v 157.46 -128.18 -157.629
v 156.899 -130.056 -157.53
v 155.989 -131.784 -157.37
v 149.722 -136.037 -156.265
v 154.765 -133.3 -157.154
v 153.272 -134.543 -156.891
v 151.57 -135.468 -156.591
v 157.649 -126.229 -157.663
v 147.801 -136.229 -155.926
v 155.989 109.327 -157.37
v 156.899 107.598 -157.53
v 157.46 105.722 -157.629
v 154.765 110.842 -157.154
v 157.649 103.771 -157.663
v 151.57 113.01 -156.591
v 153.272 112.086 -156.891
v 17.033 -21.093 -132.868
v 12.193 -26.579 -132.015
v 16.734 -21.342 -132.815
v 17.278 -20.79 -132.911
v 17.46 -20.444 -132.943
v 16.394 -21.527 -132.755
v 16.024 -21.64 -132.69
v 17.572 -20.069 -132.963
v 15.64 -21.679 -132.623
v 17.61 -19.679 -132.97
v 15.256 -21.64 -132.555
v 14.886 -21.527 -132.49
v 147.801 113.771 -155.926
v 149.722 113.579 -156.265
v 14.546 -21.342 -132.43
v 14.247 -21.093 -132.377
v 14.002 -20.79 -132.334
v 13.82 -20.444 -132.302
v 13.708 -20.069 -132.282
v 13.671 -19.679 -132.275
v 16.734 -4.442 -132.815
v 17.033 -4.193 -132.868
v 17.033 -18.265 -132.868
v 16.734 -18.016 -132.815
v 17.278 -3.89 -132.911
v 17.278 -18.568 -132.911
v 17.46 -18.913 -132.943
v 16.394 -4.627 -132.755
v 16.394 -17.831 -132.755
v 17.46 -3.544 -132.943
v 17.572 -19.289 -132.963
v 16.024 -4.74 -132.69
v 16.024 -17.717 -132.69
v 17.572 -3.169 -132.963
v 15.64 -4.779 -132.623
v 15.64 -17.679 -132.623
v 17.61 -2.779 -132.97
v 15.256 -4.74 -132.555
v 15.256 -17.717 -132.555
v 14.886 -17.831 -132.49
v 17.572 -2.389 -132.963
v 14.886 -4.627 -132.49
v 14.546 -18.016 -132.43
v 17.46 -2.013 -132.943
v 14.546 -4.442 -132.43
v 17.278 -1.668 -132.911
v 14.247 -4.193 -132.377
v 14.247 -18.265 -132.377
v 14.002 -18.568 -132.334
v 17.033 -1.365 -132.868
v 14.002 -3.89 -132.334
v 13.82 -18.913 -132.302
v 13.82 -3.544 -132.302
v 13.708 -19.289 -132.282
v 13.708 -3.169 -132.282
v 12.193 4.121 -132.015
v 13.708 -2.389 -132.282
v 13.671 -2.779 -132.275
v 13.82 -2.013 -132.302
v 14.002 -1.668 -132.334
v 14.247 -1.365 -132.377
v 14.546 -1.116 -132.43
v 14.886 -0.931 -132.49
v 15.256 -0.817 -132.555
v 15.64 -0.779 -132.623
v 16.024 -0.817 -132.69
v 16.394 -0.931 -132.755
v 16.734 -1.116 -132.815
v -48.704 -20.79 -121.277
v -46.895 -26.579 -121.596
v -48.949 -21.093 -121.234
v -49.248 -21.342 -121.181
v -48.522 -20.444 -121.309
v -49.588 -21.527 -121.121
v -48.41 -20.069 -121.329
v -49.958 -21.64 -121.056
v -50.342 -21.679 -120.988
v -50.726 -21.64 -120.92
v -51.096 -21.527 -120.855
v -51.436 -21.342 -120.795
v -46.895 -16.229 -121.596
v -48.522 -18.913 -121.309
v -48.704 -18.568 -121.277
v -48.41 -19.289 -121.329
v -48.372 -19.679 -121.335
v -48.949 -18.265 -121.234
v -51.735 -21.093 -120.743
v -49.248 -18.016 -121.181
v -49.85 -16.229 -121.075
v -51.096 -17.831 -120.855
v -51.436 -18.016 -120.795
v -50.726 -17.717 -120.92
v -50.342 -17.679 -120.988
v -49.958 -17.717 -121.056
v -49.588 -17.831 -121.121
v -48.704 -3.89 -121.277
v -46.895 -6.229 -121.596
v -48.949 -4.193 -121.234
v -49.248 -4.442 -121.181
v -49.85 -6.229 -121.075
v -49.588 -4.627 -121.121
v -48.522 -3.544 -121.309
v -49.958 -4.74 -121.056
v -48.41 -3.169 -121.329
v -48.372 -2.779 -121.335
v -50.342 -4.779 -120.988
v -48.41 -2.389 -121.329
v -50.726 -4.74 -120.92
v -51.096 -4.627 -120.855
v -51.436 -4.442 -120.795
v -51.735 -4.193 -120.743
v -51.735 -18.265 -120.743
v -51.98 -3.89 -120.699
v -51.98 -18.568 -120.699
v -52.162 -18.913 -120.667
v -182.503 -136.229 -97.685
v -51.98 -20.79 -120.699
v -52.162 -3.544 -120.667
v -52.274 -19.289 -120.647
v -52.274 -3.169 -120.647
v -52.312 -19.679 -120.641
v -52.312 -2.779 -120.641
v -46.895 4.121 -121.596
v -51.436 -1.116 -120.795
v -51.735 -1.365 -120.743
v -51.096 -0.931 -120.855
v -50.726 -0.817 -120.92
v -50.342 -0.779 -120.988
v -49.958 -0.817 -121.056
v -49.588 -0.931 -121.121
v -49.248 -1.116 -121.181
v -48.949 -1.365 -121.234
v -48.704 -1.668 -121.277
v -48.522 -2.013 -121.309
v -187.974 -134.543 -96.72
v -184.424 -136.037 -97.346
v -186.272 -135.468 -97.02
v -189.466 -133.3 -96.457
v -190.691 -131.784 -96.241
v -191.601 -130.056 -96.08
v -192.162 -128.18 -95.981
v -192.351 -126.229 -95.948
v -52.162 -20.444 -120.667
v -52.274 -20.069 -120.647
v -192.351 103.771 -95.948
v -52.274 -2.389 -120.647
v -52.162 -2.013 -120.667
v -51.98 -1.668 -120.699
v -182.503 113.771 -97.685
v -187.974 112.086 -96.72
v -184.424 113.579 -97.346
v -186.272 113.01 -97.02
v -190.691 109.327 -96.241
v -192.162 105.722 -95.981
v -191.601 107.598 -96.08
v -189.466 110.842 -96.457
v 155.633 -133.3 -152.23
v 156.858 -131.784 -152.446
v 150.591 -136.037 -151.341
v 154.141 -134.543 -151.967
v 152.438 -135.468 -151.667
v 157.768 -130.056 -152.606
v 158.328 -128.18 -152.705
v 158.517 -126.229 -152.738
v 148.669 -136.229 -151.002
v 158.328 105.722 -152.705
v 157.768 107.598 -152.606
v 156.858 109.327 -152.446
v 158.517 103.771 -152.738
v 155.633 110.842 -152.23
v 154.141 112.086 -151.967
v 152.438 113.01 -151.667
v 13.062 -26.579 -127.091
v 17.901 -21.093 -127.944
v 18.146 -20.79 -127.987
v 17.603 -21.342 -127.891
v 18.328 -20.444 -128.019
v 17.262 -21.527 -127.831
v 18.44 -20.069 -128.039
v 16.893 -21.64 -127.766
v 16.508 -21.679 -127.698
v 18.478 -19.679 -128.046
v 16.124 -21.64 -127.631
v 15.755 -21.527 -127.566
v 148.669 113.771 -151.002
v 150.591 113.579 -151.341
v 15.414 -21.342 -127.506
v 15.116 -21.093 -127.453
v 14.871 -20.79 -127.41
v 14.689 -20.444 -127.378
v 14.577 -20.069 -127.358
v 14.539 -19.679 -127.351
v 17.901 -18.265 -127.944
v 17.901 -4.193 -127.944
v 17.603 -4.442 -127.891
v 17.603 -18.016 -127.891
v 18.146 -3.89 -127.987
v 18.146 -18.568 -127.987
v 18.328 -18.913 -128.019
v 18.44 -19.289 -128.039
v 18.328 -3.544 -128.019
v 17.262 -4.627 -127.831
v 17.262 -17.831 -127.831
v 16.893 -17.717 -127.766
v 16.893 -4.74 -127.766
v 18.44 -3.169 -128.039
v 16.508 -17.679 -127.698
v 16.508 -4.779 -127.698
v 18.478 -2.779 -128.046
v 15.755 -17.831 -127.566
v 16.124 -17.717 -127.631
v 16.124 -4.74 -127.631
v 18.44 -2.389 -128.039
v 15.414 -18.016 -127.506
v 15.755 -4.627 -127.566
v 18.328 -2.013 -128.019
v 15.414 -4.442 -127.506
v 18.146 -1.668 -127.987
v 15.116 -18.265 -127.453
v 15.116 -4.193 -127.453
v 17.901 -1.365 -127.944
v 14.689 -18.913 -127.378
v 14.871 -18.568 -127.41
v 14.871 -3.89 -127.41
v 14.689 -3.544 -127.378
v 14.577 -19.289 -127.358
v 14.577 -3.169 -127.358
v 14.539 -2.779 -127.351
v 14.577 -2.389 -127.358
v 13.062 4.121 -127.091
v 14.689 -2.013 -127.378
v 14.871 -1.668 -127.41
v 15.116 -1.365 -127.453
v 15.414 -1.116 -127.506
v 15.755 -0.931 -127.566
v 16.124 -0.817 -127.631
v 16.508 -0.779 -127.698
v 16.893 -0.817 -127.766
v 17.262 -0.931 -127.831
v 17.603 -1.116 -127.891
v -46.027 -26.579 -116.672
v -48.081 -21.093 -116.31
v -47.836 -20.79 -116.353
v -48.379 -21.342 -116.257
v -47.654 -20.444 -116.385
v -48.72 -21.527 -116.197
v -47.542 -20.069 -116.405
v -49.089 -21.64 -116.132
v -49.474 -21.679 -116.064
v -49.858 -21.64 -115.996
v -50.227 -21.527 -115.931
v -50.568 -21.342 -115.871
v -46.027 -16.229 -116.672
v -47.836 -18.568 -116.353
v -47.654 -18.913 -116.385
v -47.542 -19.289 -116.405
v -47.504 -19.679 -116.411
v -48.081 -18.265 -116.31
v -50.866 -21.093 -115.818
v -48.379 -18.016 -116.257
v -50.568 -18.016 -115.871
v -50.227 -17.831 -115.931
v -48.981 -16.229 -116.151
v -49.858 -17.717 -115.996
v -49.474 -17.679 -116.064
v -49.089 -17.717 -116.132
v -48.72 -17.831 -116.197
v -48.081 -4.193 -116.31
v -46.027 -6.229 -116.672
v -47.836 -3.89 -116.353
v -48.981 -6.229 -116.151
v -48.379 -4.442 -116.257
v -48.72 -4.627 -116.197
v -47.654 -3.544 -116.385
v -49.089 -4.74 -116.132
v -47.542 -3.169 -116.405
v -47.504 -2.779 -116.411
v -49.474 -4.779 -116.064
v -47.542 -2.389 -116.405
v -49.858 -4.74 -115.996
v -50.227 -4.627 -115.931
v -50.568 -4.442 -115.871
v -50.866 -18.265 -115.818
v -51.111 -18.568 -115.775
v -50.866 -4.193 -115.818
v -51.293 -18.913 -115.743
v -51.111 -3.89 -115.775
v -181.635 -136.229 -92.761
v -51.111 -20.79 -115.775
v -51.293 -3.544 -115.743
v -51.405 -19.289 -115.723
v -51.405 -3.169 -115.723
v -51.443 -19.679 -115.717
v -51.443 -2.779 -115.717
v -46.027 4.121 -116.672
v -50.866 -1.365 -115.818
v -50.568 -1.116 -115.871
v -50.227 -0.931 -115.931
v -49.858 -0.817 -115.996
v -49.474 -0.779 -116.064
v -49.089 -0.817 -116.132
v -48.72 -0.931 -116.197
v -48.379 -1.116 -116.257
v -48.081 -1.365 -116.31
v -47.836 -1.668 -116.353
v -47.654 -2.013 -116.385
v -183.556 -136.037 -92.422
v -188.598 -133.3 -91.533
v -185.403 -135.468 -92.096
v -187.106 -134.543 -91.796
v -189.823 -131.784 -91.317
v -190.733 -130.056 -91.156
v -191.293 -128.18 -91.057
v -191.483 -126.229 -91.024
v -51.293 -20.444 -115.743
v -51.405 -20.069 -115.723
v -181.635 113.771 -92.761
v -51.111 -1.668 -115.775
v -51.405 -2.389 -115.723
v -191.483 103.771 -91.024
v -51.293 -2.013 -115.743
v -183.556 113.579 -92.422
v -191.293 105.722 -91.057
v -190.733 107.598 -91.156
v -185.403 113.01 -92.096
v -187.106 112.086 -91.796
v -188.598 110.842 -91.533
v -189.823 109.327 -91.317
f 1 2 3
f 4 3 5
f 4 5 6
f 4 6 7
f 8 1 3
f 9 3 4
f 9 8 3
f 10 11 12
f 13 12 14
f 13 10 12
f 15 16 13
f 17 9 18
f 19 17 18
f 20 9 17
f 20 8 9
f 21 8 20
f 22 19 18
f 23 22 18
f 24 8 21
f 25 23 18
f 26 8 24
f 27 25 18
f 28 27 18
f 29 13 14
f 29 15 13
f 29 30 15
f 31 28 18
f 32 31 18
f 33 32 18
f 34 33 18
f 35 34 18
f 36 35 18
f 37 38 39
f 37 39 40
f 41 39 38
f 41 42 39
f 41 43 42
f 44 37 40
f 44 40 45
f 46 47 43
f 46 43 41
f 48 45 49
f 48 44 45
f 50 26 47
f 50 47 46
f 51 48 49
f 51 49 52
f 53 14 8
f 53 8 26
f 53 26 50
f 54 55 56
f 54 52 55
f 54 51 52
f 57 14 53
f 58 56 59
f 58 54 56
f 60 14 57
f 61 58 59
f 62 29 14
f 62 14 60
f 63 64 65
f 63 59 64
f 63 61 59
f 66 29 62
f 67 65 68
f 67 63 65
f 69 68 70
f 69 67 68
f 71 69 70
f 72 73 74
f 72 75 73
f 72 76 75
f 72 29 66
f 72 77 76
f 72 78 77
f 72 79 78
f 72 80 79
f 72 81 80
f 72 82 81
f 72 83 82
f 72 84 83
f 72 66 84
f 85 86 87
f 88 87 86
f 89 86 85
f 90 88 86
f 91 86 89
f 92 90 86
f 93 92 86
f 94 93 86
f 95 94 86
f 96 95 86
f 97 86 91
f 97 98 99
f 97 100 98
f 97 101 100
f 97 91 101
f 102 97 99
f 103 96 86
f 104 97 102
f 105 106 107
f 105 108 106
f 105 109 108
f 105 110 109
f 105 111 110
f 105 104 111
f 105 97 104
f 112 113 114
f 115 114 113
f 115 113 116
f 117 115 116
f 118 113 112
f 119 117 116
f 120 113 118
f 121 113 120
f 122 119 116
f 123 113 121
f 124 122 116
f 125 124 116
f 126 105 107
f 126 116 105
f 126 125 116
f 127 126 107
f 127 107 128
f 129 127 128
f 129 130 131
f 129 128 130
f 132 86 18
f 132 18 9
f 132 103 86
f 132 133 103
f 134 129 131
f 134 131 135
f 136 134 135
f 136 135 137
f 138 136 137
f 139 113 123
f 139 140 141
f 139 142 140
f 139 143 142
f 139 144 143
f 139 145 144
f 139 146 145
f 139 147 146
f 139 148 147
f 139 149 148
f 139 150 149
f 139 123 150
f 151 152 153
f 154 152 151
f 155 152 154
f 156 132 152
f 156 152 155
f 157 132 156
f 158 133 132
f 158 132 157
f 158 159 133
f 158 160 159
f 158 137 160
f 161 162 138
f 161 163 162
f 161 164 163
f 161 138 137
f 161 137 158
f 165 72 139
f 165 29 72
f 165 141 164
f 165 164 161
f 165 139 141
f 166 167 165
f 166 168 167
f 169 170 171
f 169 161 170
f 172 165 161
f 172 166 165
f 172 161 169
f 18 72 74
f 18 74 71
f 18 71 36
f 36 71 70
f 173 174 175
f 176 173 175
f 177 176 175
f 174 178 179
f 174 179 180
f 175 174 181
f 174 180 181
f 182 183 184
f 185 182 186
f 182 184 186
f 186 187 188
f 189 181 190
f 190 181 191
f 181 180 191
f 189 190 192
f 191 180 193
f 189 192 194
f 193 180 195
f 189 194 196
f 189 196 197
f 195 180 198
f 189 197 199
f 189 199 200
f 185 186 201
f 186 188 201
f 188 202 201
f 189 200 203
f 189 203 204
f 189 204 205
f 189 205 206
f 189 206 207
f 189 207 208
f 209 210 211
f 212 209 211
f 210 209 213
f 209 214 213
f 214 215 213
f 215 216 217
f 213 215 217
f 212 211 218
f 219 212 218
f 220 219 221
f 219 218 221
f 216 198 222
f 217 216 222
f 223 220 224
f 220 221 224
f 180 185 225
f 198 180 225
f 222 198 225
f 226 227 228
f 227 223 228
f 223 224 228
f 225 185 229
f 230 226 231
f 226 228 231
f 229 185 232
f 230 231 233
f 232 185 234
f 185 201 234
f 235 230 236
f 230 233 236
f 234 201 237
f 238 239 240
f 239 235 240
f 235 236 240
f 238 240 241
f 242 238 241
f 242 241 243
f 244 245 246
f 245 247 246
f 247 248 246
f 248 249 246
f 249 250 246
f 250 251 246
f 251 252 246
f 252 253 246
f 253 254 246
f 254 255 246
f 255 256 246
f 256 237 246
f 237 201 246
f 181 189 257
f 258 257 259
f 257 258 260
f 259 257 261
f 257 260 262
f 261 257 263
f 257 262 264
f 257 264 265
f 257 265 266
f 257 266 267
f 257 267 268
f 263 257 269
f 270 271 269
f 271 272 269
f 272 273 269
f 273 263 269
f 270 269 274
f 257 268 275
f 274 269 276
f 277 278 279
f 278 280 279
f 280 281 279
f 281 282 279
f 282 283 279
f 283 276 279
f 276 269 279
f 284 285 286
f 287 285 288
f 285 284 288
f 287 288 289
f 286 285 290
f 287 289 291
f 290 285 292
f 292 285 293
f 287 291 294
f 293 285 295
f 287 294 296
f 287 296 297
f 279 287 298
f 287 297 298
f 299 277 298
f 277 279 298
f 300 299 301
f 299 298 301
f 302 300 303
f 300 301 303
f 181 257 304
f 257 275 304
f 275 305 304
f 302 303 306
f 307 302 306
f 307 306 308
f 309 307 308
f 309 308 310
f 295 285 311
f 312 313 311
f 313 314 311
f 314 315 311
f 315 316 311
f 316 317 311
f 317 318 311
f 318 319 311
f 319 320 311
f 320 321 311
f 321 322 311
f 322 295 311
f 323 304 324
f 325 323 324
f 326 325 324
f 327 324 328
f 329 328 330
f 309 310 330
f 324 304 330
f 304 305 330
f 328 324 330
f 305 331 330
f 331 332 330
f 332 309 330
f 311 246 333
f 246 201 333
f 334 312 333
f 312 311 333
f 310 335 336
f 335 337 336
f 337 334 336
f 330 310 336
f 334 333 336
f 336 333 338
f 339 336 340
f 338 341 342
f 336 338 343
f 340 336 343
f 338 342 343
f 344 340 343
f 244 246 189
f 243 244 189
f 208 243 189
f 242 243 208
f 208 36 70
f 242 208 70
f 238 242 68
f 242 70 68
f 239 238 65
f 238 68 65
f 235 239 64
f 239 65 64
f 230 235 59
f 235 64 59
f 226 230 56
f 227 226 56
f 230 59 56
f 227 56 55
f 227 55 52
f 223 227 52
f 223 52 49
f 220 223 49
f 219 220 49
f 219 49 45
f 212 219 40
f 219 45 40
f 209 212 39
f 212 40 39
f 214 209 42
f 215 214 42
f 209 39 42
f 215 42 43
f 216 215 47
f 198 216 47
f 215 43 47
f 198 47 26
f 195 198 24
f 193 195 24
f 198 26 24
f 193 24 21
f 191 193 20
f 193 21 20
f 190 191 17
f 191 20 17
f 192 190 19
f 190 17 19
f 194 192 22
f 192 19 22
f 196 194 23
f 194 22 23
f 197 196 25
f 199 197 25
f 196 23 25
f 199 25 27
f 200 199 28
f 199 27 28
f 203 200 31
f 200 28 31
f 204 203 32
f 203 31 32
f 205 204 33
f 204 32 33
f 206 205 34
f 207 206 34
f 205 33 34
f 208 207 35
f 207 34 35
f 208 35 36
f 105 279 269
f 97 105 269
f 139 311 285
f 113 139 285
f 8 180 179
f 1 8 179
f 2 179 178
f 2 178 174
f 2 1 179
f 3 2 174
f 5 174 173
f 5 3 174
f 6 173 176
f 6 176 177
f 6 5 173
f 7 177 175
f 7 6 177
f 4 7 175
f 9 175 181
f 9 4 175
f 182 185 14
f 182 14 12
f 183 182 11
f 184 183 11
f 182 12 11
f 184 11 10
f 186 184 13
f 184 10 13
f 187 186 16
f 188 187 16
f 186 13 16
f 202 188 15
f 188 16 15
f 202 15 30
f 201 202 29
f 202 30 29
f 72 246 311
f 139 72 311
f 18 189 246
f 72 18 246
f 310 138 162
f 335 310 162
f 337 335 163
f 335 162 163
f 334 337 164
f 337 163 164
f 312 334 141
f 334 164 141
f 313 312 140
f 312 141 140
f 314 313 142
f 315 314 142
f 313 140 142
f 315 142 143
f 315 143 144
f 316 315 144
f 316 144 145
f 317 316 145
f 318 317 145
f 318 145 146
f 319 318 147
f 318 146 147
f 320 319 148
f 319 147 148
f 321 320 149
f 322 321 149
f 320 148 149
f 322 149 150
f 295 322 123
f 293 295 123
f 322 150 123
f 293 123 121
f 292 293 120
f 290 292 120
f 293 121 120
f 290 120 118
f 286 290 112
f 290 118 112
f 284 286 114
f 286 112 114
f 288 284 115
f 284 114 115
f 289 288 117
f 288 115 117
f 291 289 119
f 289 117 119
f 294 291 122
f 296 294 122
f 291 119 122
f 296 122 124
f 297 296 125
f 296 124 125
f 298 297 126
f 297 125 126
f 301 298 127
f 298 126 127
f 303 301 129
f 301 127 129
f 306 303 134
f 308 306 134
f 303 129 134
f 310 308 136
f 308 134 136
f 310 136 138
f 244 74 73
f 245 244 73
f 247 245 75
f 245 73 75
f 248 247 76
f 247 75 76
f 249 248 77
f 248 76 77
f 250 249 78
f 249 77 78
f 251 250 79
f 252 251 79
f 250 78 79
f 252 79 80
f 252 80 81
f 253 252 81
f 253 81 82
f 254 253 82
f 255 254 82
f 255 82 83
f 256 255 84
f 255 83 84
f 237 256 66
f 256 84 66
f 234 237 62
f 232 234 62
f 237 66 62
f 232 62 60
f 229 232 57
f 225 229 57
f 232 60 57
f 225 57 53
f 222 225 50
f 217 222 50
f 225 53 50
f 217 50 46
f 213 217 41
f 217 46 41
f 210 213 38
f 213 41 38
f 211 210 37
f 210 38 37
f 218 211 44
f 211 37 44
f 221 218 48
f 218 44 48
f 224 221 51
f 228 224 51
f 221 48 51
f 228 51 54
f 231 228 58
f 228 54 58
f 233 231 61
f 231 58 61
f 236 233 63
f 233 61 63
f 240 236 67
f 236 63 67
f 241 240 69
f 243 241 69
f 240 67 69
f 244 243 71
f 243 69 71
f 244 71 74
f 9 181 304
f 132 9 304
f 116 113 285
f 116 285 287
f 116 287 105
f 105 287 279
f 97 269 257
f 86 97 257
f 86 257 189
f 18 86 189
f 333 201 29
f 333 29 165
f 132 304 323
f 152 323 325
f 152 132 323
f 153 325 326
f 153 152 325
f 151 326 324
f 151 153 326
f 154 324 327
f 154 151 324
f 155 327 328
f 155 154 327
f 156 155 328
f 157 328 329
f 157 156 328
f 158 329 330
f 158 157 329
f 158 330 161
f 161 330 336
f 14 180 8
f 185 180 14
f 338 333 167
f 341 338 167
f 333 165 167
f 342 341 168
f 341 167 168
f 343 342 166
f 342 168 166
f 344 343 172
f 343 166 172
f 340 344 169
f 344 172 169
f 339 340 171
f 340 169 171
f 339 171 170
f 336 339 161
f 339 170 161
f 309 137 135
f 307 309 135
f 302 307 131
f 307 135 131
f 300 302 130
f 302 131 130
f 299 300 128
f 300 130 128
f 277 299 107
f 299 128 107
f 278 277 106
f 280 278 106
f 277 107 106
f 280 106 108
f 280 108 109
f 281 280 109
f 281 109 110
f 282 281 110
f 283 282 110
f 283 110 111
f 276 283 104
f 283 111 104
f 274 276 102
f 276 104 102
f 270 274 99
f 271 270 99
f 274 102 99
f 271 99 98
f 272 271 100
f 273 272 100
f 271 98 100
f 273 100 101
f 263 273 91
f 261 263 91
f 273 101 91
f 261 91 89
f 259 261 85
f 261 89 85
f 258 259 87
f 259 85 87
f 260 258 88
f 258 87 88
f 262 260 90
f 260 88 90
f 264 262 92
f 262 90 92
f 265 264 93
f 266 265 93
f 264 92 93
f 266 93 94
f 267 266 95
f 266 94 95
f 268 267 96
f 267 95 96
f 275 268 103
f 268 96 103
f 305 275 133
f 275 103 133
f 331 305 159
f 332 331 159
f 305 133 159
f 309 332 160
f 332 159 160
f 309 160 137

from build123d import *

# Parameters (mm, degrees)
SKETCH1_W           = 355.39931416
SKETCH1_H           = 250
BOSS_EXTRUDE1_DEPTH = 5
CUT_EXTRUDE1_DEPTH  = 10
SKETCH3_R           = 2
CUT_EXTRUDE2_DEPTH  = 5
FILLET1_R           = 10


with BuildPart() as part:
    # Sketch1 → Boss-Extrude1 (new body)
    with BuildSketch(Plane(origin=(-21.339939358, 0, -121.024810115), x_dir=(-0.984807753, 0, 0.173648178), z_dir=(-0.173648178, 0, -0.984807753))):
        with Locations((-4.932202266, -11.228757924)):
            Rectangle(SKETCH1_W, SKETCH1_H)
    extrude(amount=BOSS_EXTRUDE1_DEPTH)

    # Sketch2 → Cut-Extrude1 (cut)
    with BuildSketch(Plane(origin=(-21.339939358, 0, -121.024810115), x_dir=(0.984807753, 0, -0.173648178), z_dir=(0.173648178, 0, 0.984807753))):
        Polygon((-25.067797734, -16.228757924), (-25.067797734, -26.578757924), (34.932202266, -26.578757924), (34.932202266, 4.121242076), (-25.067797734, 4.121242076), (-25.067797734, -6.228757924), (-28.067797734, -6.228757924), (-28.067797734, -16.228757924), align=None)
    extrude(amount=-CUT_EXTRUDE1_DEPTH, mode=Mode.SUBTRACT)

    # Sketch3 → Cut-Extrude2 (cut)
    with BuildSketch(Plane(origin=(-22.208180247, 0, -125.94884888), x_dir=(-0.984807753, 0, 0.173648178), z_dir=(-0.173648178, 0, -0.984807753))):
        with Locations((28.567797734, -19.678757924)):
            Circle(SKETCH3_R)
        with Locations((28.567797734, -2.778757924)):
            Circle(SKETCH3_R)
        with Locations((-38.432202266, -2.778757924)):
            Circle(SKETCH3_R)
        with Locations((-38.432202266, -19.678757924)):
            Circle(SKETCH3_R)
    extrude(amount=-CUT_EXTRUDE2_DEPTH, mode=Mode.SUBTRACT)

    # Fillet1
    fillet1_edges = [part.edges().sort_by_distance(p)[0] for p in [
        (158.083211229, 113.771242076, -155.200519056),
        (-191.916788771, 113.771242076, -93.486075809),
        (-191.916788771, -136.228757924, -93.486075809),
        (158.083211229, -136.228757924, -155.200519056),
    ]]
    fillet(fillet1_edges, radius=FILLET1_R)


solid = part.part
